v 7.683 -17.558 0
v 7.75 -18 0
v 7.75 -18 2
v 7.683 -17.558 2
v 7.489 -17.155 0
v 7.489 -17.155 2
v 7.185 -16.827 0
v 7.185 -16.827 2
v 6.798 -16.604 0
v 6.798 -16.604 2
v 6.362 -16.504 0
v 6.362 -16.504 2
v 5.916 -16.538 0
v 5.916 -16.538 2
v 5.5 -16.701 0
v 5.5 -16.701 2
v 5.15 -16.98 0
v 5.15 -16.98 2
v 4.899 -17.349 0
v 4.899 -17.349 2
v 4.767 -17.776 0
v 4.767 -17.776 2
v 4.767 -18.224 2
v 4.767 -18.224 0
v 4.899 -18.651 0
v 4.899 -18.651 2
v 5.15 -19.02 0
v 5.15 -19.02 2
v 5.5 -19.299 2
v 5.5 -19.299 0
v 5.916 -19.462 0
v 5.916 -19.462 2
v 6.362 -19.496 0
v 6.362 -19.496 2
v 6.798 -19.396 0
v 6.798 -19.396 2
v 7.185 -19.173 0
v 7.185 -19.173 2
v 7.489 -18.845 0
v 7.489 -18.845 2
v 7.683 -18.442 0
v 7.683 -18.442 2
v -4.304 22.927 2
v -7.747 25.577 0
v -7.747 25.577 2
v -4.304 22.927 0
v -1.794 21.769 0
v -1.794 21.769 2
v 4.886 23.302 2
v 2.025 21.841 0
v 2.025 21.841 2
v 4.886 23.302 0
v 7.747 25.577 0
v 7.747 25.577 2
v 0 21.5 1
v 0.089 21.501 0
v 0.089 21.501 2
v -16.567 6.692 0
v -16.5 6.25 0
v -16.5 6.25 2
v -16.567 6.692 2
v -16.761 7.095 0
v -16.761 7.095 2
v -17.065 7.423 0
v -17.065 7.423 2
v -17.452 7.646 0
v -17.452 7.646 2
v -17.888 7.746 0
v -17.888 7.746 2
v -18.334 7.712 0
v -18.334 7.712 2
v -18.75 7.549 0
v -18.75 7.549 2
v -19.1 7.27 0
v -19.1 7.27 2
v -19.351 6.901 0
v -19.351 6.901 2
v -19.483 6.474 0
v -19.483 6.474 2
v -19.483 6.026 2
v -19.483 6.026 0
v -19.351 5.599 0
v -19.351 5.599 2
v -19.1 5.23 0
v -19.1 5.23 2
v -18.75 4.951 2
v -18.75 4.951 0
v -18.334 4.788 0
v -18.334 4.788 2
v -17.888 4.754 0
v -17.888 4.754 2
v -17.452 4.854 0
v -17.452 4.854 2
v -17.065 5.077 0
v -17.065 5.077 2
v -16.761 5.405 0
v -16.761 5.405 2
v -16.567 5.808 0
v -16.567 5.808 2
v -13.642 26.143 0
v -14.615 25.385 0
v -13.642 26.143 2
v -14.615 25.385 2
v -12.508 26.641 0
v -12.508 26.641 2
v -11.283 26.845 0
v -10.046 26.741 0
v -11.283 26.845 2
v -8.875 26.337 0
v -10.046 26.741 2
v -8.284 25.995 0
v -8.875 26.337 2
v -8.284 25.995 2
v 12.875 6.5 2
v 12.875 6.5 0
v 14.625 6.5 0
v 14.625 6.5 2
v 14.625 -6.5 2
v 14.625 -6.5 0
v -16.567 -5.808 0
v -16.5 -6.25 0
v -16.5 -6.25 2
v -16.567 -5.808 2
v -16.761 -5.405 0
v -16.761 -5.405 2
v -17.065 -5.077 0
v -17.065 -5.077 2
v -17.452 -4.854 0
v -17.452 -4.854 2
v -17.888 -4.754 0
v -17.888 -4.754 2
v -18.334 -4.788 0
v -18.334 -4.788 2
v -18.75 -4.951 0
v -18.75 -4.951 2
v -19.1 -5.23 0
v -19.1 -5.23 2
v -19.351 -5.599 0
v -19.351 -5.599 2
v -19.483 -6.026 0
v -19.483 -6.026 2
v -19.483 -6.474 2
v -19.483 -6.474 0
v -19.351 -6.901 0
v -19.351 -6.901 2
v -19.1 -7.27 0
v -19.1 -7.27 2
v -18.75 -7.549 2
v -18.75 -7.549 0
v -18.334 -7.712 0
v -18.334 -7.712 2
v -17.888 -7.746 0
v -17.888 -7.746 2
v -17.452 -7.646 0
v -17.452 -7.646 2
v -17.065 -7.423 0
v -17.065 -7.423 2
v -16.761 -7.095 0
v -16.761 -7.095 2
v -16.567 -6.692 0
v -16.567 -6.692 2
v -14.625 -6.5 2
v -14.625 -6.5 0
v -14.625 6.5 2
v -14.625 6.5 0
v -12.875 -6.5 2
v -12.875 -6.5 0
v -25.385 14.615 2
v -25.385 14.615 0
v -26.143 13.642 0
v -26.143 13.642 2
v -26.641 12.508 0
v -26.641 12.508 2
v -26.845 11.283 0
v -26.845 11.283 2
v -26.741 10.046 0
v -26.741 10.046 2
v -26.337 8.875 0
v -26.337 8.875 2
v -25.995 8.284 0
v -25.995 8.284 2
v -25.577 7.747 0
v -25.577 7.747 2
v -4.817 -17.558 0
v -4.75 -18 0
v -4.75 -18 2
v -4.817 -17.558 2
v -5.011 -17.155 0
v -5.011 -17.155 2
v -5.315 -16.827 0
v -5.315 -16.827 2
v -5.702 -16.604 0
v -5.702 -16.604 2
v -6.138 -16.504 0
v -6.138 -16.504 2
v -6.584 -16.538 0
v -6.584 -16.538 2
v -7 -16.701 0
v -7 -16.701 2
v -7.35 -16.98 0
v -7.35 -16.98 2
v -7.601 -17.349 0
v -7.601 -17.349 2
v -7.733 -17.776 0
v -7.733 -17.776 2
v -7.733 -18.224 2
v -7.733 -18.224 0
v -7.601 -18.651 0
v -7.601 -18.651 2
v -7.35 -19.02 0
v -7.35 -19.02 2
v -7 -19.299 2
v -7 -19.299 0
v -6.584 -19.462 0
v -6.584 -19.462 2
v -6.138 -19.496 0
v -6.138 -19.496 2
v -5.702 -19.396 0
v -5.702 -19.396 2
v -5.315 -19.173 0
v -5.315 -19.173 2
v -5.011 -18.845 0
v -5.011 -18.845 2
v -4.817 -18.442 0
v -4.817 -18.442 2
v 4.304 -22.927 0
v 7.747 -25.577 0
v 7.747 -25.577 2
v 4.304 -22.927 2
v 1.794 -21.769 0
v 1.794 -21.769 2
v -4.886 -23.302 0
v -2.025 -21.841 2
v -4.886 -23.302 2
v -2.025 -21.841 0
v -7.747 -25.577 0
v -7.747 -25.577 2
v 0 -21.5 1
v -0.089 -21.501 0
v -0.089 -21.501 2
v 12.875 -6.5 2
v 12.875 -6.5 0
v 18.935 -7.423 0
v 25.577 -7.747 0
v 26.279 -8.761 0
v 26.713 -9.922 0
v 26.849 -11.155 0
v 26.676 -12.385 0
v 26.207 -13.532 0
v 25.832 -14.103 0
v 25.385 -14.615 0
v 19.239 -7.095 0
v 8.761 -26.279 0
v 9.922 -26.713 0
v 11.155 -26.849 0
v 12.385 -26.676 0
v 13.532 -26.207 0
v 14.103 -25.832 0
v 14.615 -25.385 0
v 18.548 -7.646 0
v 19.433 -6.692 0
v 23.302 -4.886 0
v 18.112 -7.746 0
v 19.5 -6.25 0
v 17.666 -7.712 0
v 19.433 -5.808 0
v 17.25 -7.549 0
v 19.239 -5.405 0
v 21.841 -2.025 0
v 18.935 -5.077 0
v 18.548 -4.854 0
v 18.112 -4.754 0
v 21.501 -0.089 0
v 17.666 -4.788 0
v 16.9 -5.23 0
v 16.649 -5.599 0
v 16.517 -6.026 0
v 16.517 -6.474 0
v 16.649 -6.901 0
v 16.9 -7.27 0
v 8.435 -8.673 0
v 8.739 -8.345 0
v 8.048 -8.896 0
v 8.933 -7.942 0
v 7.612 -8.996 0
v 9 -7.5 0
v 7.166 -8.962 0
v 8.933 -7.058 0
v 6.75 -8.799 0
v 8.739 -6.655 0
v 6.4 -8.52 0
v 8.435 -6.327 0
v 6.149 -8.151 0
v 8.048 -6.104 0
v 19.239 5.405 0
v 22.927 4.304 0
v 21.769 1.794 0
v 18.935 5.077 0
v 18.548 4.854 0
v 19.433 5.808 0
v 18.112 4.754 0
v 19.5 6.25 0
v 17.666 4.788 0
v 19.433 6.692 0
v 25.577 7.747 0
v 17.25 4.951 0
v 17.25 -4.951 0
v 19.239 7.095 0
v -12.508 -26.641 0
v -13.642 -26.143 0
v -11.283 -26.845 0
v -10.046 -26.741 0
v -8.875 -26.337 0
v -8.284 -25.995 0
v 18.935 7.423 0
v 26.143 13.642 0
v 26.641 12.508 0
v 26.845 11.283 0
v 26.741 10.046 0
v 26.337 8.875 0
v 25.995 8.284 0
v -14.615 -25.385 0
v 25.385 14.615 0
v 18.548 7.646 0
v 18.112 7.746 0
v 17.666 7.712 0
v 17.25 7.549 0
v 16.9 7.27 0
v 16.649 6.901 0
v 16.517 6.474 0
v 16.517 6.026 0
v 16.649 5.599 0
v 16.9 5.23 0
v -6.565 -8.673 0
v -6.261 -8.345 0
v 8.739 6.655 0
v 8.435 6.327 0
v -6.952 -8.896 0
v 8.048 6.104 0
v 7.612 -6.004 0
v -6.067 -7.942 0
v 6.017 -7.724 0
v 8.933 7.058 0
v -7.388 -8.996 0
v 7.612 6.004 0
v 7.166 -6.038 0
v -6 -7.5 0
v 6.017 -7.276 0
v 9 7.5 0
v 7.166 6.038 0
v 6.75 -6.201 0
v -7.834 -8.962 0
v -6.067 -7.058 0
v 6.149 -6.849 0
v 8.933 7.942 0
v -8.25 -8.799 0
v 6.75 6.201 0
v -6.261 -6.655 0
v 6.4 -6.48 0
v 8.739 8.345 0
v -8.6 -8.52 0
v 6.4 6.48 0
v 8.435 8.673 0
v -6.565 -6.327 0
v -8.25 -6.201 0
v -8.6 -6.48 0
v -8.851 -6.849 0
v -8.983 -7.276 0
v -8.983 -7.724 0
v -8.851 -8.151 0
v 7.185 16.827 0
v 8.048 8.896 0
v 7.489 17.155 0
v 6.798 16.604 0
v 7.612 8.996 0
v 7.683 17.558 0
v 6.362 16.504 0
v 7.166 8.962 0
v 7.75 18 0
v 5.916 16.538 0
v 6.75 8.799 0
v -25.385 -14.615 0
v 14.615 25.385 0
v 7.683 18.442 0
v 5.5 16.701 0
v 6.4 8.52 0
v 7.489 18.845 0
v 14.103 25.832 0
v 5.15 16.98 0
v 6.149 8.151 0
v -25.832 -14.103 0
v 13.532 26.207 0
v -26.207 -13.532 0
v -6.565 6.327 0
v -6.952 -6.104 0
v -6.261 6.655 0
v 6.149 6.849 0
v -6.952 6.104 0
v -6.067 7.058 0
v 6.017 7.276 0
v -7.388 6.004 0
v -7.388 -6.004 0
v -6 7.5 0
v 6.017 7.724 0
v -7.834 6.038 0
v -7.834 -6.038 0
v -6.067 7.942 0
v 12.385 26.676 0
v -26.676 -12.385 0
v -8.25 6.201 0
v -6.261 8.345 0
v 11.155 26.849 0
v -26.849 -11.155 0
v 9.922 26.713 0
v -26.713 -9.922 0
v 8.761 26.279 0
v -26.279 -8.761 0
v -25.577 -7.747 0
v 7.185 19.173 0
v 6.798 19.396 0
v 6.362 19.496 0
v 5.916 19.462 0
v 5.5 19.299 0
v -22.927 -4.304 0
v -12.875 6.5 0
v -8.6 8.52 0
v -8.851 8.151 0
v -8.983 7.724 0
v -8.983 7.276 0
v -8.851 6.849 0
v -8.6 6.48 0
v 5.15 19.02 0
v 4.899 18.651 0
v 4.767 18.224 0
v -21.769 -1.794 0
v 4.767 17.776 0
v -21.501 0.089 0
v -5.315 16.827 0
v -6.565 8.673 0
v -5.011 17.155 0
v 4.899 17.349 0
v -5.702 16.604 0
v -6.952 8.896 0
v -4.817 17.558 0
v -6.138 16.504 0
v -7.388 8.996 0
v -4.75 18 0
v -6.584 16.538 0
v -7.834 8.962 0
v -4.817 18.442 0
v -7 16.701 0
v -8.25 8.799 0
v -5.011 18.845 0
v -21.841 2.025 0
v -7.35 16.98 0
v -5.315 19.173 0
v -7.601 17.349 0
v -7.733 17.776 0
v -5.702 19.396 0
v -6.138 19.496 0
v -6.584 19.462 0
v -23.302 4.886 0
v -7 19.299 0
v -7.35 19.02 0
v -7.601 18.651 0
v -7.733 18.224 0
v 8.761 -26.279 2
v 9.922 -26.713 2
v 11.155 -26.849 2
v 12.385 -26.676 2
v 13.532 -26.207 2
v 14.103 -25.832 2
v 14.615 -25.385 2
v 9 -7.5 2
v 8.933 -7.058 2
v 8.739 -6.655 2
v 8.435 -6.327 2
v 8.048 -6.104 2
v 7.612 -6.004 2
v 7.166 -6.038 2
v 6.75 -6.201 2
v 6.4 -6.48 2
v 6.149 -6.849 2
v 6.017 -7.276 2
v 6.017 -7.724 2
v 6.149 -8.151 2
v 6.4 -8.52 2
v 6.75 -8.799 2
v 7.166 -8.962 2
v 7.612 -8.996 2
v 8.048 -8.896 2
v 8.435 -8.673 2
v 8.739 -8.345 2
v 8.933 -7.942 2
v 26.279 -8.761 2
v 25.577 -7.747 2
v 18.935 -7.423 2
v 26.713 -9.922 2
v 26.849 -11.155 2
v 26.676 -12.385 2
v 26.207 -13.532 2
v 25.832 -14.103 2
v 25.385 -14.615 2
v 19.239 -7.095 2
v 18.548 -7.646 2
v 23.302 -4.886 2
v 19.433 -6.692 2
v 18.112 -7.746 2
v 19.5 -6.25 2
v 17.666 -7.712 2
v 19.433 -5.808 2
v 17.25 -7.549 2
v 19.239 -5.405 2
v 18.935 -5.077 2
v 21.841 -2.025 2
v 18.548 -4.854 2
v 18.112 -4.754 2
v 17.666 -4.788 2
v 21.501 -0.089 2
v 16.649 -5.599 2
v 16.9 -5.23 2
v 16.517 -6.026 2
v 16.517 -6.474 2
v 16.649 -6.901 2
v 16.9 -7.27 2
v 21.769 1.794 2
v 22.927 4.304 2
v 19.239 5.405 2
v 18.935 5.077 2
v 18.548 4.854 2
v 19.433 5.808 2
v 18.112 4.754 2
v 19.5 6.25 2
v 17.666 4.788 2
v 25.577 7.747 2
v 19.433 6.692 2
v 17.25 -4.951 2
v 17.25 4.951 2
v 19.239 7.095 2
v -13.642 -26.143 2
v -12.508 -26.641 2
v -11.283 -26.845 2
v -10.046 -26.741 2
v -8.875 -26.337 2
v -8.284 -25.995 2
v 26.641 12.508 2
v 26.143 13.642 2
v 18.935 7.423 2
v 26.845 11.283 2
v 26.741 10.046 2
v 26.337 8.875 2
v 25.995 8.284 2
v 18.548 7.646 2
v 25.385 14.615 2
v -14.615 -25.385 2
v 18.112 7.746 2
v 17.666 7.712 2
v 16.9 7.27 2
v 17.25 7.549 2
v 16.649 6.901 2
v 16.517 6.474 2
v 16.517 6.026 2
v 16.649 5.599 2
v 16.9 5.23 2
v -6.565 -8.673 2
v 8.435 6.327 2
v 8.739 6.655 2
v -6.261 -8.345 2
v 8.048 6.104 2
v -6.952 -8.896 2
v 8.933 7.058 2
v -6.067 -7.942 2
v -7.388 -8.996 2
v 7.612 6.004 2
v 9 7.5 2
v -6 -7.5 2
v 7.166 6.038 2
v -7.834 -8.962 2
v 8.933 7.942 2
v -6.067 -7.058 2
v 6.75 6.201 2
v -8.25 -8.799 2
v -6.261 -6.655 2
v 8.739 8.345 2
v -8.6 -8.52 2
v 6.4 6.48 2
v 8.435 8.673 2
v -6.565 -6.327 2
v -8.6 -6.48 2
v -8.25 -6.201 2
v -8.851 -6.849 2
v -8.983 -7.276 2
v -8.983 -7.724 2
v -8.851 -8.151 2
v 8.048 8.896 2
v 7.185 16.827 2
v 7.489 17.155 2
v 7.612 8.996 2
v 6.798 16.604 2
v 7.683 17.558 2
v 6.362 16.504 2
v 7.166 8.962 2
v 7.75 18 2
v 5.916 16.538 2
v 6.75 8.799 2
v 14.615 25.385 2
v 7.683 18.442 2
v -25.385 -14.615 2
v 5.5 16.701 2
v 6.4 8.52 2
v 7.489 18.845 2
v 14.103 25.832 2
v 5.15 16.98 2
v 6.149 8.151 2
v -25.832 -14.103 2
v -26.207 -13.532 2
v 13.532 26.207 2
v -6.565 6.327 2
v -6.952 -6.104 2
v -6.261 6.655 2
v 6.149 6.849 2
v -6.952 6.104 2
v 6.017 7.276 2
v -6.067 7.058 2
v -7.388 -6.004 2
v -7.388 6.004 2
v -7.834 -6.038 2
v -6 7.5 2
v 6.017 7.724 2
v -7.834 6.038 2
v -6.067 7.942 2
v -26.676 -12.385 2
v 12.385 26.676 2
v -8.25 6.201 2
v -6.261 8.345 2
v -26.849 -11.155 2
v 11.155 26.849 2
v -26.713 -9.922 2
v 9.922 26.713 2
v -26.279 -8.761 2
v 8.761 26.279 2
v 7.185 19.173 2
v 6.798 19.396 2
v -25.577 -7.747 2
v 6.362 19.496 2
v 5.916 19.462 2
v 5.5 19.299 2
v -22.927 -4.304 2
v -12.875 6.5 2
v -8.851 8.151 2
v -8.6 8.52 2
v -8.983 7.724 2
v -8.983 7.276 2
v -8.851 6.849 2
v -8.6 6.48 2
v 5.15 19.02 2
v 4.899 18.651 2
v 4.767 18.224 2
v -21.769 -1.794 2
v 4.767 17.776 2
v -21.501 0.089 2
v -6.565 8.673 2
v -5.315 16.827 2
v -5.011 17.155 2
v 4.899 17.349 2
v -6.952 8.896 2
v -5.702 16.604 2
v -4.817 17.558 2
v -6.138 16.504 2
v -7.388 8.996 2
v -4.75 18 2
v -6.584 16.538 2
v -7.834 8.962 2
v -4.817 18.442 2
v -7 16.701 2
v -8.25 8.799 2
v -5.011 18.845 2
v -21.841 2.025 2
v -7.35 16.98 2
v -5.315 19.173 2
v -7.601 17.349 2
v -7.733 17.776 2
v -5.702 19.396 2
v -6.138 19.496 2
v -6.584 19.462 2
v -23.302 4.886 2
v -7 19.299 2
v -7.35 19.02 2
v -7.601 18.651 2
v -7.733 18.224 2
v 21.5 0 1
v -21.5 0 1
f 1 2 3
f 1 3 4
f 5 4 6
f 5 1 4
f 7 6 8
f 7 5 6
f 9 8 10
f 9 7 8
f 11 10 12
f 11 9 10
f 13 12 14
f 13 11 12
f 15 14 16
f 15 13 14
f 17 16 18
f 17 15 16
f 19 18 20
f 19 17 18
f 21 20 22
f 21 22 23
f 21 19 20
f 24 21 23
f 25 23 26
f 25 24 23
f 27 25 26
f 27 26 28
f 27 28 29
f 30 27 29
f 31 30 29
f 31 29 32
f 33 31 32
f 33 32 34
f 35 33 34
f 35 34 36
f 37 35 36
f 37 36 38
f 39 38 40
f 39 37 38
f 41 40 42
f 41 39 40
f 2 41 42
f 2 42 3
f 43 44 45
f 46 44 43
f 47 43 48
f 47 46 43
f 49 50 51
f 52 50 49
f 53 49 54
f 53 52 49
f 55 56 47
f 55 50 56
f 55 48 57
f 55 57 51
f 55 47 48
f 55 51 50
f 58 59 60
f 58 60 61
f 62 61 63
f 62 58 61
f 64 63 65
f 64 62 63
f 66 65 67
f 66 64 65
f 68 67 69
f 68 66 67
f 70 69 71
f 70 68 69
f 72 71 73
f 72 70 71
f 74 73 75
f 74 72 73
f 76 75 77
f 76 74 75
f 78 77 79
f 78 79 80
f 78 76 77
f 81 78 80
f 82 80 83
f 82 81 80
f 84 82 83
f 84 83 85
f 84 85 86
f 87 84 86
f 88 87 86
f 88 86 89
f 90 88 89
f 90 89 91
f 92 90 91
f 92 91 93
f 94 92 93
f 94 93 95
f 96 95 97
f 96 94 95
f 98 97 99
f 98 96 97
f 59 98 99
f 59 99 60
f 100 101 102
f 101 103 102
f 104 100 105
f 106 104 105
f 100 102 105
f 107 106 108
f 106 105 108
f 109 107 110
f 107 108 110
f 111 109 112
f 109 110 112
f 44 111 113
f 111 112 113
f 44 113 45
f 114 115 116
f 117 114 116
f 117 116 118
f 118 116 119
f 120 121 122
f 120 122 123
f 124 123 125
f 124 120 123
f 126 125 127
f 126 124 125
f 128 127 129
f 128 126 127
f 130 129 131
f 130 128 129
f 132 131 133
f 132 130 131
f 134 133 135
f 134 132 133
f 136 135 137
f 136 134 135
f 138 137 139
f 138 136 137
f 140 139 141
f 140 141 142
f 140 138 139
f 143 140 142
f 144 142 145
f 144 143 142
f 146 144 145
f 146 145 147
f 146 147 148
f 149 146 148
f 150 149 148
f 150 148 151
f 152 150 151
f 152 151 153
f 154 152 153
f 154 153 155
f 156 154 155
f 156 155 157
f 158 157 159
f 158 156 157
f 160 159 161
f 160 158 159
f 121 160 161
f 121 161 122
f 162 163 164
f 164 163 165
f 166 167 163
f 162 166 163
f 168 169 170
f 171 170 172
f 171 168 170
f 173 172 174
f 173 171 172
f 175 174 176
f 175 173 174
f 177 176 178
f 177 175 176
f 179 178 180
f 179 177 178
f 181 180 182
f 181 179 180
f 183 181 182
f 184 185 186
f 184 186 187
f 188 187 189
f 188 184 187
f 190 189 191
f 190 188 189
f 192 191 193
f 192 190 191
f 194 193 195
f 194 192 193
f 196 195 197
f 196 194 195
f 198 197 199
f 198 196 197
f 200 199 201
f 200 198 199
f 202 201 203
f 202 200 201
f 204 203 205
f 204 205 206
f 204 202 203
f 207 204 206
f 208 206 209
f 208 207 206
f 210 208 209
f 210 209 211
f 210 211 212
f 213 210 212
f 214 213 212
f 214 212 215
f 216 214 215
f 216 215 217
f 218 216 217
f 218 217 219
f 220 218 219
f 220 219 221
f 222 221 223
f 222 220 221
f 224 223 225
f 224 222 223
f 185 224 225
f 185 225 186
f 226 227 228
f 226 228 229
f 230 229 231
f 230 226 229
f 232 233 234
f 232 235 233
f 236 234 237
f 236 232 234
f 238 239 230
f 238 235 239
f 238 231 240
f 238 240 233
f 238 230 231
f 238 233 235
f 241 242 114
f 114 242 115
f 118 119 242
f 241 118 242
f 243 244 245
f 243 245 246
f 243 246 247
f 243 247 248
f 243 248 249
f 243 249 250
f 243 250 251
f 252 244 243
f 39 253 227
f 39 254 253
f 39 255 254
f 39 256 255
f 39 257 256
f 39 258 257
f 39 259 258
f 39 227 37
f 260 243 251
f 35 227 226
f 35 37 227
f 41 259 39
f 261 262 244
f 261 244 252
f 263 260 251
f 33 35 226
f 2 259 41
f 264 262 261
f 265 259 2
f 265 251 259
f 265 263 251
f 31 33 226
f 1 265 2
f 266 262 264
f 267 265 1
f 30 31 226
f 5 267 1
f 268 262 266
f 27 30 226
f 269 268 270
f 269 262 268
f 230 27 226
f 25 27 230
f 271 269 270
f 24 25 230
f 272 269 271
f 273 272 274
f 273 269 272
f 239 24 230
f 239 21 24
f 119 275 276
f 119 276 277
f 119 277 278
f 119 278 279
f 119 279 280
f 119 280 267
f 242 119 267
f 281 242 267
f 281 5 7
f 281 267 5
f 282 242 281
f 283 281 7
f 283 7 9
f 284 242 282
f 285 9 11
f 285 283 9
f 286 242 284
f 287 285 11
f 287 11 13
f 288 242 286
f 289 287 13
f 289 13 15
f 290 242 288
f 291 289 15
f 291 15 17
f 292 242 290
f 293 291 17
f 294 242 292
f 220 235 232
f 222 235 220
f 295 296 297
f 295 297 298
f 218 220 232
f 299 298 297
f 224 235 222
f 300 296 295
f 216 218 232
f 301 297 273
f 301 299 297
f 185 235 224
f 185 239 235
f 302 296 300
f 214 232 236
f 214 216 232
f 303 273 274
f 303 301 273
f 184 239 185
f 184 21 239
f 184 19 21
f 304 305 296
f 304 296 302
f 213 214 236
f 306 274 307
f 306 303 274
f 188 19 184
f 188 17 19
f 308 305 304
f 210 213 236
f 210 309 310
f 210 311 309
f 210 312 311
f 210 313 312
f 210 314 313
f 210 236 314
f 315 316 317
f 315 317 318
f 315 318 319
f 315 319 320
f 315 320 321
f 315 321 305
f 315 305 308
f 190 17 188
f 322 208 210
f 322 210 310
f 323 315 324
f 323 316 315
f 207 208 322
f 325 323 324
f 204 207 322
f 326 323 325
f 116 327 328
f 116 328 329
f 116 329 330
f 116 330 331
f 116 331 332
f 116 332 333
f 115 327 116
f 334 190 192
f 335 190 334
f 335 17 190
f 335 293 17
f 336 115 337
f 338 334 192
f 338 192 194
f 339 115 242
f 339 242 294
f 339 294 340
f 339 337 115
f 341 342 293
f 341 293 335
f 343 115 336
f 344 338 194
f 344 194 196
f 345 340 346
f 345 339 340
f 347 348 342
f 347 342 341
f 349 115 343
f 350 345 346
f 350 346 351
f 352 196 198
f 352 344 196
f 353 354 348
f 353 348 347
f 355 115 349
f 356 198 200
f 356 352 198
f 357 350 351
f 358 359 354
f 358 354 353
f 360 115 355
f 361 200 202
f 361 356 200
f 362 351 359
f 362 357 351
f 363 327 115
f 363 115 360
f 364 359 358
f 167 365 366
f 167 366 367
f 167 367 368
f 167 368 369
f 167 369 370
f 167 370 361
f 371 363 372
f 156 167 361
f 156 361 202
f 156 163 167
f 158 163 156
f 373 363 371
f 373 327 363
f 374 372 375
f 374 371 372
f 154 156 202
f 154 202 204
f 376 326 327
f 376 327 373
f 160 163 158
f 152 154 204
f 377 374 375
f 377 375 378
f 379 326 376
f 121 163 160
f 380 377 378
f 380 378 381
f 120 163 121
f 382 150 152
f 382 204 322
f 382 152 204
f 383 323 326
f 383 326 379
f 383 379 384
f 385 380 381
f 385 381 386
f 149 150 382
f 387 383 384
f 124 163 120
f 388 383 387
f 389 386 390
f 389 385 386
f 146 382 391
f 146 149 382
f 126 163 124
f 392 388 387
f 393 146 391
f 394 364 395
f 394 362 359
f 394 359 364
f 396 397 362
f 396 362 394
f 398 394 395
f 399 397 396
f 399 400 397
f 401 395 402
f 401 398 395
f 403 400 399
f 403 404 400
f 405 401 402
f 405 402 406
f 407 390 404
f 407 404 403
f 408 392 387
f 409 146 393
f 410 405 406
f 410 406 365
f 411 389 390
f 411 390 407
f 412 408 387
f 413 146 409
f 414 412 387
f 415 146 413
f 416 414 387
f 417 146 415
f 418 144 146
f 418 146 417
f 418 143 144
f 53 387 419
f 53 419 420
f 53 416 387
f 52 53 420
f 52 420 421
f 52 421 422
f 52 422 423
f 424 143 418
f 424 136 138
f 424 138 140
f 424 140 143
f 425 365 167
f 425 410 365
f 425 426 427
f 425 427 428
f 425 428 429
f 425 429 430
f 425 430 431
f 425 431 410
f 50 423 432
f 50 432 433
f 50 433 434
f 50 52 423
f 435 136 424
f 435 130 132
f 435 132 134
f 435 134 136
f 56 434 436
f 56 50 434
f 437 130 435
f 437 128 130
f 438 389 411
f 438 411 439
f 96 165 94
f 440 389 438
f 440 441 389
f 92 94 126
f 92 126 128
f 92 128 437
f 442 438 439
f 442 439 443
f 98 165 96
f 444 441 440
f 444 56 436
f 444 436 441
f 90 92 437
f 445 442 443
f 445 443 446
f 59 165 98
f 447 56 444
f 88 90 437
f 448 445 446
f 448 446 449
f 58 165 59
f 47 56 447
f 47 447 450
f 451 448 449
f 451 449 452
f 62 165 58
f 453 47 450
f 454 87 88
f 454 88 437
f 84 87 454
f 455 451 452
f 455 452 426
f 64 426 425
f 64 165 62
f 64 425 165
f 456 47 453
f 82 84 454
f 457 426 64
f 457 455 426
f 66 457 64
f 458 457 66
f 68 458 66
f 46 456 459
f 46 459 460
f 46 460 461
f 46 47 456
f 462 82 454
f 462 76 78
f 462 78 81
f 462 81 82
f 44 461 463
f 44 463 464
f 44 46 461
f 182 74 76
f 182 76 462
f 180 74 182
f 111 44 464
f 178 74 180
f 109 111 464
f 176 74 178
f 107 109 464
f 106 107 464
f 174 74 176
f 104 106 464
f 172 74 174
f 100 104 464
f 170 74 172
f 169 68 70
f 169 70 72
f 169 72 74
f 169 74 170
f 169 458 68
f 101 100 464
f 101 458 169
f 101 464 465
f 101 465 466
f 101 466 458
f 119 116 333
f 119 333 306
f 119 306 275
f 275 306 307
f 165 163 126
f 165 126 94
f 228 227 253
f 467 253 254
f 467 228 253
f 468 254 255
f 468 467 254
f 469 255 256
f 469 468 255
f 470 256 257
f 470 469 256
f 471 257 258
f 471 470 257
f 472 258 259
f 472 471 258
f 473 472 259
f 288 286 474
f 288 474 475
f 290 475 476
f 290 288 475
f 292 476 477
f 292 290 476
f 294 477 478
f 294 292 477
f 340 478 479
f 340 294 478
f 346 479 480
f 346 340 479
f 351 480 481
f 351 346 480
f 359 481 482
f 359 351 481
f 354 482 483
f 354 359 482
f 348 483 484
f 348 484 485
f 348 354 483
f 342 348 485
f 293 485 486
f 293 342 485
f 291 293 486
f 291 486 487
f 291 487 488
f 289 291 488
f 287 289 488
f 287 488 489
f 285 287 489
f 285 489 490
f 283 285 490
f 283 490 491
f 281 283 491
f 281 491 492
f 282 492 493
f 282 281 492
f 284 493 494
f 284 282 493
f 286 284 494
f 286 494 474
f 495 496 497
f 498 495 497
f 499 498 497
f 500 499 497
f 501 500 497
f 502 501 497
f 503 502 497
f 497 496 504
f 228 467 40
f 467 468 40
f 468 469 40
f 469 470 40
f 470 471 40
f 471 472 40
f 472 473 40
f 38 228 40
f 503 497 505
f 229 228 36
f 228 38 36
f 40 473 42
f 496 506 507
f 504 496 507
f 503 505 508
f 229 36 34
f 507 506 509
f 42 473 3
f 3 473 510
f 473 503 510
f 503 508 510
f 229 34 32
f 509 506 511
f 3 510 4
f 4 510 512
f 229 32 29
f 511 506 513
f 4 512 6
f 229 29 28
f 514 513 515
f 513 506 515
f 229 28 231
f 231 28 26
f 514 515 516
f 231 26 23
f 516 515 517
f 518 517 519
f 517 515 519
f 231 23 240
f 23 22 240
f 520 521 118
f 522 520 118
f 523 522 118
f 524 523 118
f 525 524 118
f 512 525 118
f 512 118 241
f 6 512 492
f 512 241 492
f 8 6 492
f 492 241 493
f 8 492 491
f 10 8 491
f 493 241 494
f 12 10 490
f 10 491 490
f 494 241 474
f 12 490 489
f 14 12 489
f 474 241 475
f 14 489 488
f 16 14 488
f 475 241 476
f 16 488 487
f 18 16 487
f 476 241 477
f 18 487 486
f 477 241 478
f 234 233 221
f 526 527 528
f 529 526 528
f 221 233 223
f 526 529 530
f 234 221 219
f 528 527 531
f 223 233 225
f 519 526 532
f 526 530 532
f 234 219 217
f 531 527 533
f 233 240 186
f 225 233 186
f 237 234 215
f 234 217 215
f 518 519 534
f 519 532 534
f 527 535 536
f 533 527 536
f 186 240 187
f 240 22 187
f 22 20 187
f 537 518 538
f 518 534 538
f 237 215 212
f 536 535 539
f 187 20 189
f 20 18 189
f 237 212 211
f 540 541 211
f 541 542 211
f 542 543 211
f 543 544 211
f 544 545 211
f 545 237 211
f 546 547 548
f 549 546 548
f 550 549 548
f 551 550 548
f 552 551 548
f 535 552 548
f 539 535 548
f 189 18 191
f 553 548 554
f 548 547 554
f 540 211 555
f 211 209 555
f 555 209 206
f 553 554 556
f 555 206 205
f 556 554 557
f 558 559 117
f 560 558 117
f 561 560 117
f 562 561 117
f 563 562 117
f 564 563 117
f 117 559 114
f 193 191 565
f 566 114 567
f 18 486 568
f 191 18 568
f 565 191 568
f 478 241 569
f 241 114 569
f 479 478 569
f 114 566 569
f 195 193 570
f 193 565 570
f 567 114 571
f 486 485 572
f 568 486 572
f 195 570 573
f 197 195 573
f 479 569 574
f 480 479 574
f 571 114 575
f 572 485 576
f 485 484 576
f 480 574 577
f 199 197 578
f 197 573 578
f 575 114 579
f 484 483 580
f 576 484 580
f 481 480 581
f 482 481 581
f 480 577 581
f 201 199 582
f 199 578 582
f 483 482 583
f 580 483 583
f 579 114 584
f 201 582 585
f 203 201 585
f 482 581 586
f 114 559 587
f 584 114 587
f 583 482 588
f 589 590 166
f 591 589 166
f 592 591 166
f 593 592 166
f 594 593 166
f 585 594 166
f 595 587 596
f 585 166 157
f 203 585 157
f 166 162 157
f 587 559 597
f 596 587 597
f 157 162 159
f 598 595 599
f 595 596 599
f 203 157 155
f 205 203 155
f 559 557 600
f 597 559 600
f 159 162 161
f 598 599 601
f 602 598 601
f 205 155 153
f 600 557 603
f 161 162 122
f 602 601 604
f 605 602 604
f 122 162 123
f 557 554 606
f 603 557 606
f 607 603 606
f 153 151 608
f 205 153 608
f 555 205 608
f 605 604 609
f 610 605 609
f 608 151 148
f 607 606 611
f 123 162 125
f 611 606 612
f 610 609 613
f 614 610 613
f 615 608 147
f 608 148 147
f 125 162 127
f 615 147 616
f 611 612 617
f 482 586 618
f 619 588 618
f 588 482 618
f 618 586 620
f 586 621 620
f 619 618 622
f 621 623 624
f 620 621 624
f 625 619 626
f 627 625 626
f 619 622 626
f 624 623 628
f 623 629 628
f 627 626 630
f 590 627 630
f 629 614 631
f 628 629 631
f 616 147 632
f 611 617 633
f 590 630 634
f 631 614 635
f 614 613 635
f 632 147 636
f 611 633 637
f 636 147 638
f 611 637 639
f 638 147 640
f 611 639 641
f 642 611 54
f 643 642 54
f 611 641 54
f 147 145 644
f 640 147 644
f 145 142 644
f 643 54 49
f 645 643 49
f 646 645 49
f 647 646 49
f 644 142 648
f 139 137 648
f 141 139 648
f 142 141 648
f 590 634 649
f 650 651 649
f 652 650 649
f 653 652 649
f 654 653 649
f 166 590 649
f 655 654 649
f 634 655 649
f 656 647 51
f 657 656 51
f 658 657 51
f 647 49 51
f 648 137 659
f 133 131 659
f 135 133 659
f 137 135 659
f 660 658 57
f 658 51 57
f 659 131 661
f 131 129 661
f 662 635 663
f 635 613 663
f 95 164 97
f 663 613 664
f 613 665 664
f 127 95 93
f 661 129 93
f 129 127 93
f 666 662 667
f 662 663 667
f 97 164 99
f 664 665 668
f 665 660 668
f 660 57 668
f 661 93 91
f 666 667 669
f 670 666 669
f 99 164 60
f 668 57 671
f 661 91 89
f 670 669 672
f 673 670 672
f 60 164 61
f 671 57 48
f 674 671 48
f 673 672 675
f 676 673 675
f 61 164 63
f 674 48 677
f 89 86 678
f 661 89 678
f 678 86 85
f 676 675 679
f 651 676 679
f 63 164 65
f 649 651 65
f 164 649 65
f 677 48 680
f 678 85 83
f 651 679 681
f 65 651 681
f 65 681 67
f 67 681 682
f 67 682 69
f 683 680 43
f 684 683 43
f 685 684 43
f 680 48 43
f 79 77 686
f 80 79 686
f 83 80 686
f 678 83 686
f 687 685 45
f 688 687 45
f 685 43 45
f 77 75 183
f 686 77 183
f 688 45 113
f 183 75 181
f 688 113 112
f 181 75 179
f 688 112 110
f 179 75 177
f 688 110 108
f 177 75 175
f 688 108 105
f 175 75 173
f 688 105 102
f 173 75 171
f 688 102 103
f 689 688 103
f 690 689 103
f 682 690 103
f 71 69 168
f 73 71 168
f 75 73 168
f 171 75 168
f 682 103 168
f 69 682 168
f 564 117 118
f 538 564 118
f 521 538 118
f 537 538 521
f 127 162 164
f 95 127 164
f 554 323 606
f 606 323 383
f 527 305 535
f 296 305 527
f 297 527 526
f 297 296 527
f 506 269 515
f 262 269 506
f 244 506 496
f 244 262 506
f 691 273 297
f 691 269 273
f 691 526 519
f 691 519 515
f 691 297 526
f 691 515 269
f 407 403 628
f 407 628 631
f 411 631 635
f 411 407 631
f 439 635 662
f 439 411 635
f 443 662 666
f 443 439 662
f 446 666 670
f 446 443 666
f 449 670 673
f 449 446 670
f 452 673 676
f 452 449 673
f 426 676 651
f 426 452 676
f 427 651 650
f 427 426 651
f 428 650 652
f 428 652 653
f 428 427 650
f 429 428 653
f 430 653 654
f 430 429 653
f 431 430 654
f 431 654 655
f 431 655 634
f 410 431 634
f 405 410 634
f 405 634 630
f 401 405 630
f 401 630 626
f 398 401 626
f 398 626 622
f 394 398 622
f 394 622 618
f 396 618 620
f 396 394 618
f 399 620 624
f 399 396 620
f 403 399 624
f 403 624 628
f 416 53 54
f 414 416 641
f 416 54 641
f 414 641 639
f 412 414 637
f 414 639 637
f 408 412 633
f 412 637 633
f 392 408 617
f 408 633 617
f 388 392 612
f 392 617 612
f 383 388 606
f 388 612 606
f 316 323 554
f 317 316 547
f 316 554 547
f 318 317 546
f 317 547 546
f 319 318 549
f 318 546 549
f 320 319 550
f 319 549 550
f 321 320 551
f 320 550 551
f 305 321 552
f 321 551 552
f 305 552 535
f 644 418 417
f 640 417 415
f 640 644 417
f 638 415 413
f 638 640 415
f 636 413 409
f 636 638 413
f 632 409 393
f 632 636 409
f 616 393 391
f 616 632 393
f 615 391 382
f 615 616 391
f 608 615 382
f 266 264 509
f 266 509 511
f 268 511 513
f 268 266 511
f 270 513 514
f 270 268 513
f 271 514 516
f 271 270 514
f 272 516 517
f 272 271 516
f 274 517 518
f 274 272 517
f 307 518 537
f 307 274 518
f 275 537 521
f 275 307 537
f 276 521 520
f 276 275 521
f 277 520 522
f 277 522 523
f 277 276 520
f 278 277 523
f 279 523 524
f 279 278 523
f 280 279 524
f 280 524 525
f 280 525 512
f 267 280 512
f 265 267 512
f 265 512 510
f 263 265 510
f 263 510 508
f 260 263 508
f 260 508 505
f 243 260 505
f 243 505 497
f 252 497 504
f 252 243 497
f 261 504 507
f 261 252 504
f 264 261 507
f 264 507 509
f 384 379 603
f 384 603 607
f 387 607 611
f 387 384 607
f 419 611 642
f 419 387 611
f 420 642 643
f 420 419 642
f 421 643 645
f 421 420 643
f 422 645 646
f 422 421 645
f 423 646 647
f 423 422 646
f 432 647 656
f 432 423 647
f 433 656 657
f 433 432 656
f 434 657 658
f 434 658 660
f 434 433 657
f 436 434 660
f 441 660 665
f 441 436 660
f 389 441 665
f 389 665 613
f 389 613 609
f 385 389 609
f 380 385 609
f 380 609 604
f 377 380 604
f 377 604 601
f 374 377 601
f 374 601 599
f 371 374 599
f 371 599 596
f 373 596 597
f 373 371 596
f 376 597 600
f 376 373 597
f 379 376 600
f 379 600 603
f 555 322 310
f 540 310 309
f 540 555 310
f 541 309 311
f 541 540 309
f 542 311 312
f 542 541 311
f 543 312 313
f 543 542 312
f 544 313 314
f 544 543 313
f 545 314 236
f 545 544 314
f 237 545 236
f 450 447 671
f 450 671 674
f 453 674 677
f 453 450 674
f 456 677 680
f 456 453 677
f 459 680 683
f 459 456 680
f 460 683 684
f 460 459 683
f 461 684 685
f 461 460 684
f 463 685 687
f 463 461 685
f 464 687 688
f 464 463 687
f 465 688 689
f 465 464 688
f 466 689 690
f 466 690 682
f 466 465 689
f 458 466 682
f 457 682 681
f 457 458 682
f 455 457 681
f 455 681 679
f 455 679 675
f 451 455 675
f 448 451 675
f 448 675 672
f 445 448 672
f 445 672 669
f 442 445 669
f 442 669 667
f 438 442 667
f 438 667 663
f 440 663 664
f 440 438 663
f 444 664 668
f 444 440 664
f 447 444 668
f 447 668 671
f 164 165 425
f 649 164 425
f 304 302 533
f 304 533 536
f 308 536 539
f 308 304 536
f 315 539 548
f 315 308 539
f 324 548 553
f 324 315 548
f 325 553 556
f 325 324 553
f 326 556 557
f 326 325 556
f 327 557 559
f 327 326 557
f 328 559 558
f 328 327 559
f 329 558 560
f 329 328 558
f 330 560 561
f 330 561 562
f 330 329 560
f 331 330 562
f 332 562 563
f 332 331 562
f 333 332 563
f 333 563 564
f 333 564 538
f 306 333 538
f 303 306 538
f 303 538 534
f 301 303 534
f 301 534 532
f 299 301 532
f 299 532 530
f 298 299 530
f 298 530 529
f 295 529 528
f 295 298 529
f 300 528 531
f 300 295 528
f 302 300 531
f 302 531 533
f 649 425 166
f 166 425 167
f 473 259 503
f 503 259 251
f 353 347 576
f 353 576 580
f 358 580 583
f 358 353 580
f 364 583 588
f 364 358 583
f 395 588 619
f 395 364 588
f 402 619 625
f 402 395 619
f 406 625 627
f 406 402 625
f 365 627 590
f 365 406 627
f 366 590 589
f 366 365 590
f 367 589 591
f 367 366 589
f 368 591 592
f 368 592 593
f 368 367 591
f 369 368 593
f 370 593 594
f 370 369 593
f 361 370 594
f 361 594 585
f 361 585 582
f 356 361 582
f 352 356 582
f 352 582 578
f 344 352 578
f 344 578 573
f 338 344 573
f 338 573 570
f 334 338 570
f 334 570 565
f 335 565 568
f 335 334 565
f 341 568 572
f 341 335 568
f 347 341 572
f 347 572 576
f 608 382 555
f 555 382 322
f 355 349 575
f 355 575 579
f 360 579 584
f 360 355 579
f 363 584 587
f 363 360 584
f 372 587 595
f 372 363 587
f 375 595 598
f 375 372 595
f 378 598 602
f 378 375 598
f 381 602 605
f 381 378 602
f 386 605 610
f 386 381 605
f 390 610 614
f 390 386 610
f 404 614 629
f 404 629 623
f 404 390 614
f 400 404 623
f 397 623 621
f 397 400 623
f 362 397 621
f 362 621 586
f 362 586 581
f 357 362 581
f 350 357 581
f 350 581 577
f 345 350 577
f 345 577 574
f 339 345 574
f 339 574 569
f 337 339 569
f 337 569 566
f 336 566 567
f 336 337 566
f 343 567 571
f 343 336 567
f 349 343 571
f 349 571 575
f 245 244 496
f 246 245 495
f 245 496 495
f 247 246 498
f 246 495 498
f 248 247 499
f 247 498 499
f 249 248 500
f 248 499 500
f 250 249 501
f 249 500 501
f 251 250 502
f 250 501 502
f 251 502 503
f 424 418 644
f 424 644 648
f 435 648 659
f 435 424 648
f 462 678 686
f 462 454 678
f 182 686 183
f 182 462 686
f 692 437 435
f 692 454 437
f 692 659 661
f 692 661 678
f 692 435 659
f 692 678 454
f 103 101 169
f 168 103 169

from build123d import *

# Parameters (mm, degrees)
F0_R     = 1.5
F1_DEPTH = 2
F2_R     = 5


with BuildPart() as f1:
    # F0 (on Top) → F1 (new body)
    with BuildSketch(Plane.XY):
        with BuildLine():
            add(Edge.make_bspline(
                [(-13.142859, 26.857141), (-8.951076, 24.20284), (-4.564468, 21.895542), (0, 20)],
                knots=[66.18026, 66.18026, 66.18026, 66.18026, 80.865454, 80.865454, 80.865454, 80.865454], degree=3))
            Line((-13.142859, 26.857141), (-20, 20))
            Line((-20, 20), (-26.857141, 13.142859))
            add(Edge.make_bspline(
                [(-26.857141, 13.142859), (-24.20284, 8.951076), (-21.895542, 4.564468), (-20, 0)],
                knots=[66.18026, 66.18026, 66.18026, 66.18026, 80.865454, 80.865454, 80.865454, 80.865454], degree=3))
            Line((-20, 0), (-14.625, 0))
            Line((-14.625, 0), (-14.625, 6.5))
            Line((-14.625, 6.5), (-12.875, 6.5))
            Line((-12.875, 6.5), (-12.875, 0))
            Line((-12.875, 0), (0, 0))
            Line((0, 0), (0, 20))
        make_face()
        with Locations((-18, 6.25)):
            Circle(F0_R, mode=Mode.SUBTRACT)
        with Locations((-7.5, 7.5)):
            Circle(F0_R, mode=Mode.SUBTRACT)
        with Locations((-6.25, 18)):
            Circle(F0_R, mode=Mode.SUBTRACT)
        with BuildLine():
            Line((-14.625, 0), (-20, 0))
            add(Edge.make_bspline(
                [(-26.854903, -13.145097), (-24.198754, -8.951027), (-21.891877, -4.563394), (-20, 0)],
                knots=[66.166, 66.166, 66.166, 66.166, 80.865454, 80.865454, 80.865454, 80.865454], degree=3))
            Line((-26.854903, -13.145097), (-20, -20))
            Line((-20, -20), (-13.145097, -26.854903))
            add(Edge.make_bspline(
                [(0, -20), (-4.563394, -21.891877), (-8.951027, -24.198754), (-13.145097, -26.854903)],
                knots=[0, 0, 0, 0, 14.699453, 14.699453, 14.699453, 14.699453], degree=3))
            Line((0, -20), (0, 0))
            Line((0, 0), (-12.875, 0))
            Line((-12.875, 0), (-12.875, -6.5))
            Line((-12.875, -6.5), (-14.625, -6.5))
            Line((-14.625, -6.5), (-14.625, 0))
        make_face()
        with Locations((-6.25, -18)):
            Circle(F0_R, mode=Mode.SUBTRACT)
        with Locations((-18, -6.25)):
            Circle(F0_R, mode=Mode.SUBTRACT)
        with Locations((-7.5, -7.5)):
            Circle(F0_R, mode=Mode.SUBTRACT)
        with BuildLine():
            Line((-11.161165, 28.838835), (-13.142859, 26.857141))
            add(Edge.make_bspline(
                [(-13.142859, 26.857141), (-8.951076, 24.20284), (-4.564468, 21.895542), (0, 20)],
                knots=[66.18026, 66.18026, 66.18026, 66.18026, 80.865454, 80.865454, 80.865454, 80.865454], degree=3))
            add(Edge.make_bspline(
                [(13.145097, 26.854903), (8.951027, 24.198754), (4.563394, 21.891877), (0, 20)],
                knots=[66.166, 66.166, 66.166, 66.166, 80.865454, 80.865454, 80.865454, 80.865454], degree=3))
            Line((13.145097, 26.854903), (11.161165, 28.838835))
            add(Edge.make_bspline(
                [(-11.161165, 28.838835), (-7.440777, 25.169417), (0, 17.830583), (7.440777, 25.169417), (11.161165, 28.838835)],
                knots=[0, 0, 0, 0, 13.357773, 26.715546, 26.715546, 26.715546, 26.715546], degree=3))
        make_face()
        with BuildLine():
            add(Edge.make_bspline(
                [(-26.857141, 13.142859), (-24.20284, 8.951076), (-21.895542, 4.564468), (-20, 0)],
                knots=[66.18026, 66.18026, 66.18026, 66.18026, 80.865454, 80.865454, 80.865454, 80.865454], degree=3))
            Line((-26.857141, 13.142859), (-28.838835, 11.161165))
            add(Edge.make_bspline(
                [(-28.838835, -11.161165), (-25.169417, -7.440777), (-17.830583, 0), (-25.169417, 7.440777), (-28.838835, 11.161165)],
                knots=[0, 0, 0, 0, 13.357773, 26.715546, 26.715546, 26.715546, 26.715546], degree=3))
            Line((-28.838835, -11.161165), (-26.854903, -13.145097))
            add(Edge.make_bspline(
                [(-26.854903, -13.145097), (-24.198754, -8.951027), (-21.891877, -4.563394), (-20, 0)],
                knots=[66.166, 66.166, 66.166, 66.166, 80.865454, 80.865454, 80.865454, 80.865454], degree=3))
        make_face()
        with BuildLine():
            Line((28.838835, 11.161165), (26.854903, 13.145097))
            add(Edge.make_bspline(
                [(26.854903, 13.145097), (24.198754, 8.951027), (21.891877, 4.563394), (20, 0)],
                knots=[66.166, 66.166, 66.166, 66.166, 80.865454, 80.865454, 80.865454, 80.865454], degree=3))
            add(Edge.make_bspline(
                [(20, 0), (21.891877, -4.563394), (24.198754, -8.951027), (26.854903, -13.145097)],
                knots=[0, 0, 0, 0, 14.699454, 14.699454, 14.699454, 14.699454], degree=3))
            Line((26.854903, -13.145097), (28.838835, -11.161165))
            add(Edge.make_bspline(
                [(28.838835, 11.161165), (25.169417, 7.440777), (17.830583, 0), (25.169417, -7.440777), (28.838835, -11.161165)],
                knots=[0, 0, 0, 0, 13.357773, 26.715546, 26.715546, 26.715546, 26.715546], degree=3))
        make_face()
        with BuildLine():
            Line((12.875, 0), (0, 0))
            Line((0, 0), (0, -20))
            add(Edge.make_bspline(
                [(0, -20), (4.563394, -21.891877), (8.951027, -24.198754), (13.145097, -26.854903)],
                knots=[0, 0, 0, 0, 14.699453, 14.699453, 14.699453, 14.699453], degree=3))
            Line((13.145097, -26.854903), (20, -20))
            Line((20, -20), (26.854903, -13.145097))
            add(Edge.make_bspline(
                [(20, 0), (21.891877, -4.563394), (24.198754, -8.951027), (26.854903, -13.145097)],
                knots=[0, 0, 0, 0, 14.699454, 14.699454, 14.699454, 14.699454], degree=3))
            Line((20, 0), (14.625, 0))
            Line((14.625, 0), (14.625, -6.5))
            Line((14.625, -6.5), (12.875, -6.5))
            Line((12.875, -6.5), (12.875, 0))
        make_face()
        with Locations((6.25, -18)):
            Circle(F0_R, mode=Mode.SUBTRACT)
        with Locations((7.5, -7.5)):
            Circle(F0_R, mode=Mode.SUBTRACT)
        with Locations((18, -6.25)):
            Circle(F0_R, mode=Mode.SUBTRACT)
        with BuildLine():
            add(Edge.make_bspline(
                [(0, -20), (4.563394, -21.891877), (8.951027, -24.198754), (13.145097, -26.854903)],
                knots=[0, 0, 0, 0, 14.699453, 14.699453, 14.699453, 14.699453], degree=3))
            add(Edge.make_bspline(
                [(0, -20), (-4.563394, -21.891877), (-8.951027, -24.198754), (-13.145097, -26.854903)],
                knots=[0, 0, 0, 0, 14.699453, 14.699453, 14.699453, 14.699453], degree=3))
            Line((-13.145097, -26.854903), (-11.161165, -28.838835))
            add(Edge.make_bspline(
                [(11.161165, -28.838835), (7.440777, -25.169417), (0, -17.830583), (-7.440777, -25.169417), (-11.161165, -28.838835)],
                knots=[0, 0, 0, 0, 13.357773, 26.715546, 26.715546, 26.715546, 26.715546], degree=3))
            Line((11.161165, -28.838835), (13.145097, -26.854903))
        make_face()
        with BuildLine():
            add(Edge.make_bspline(
                [(13.145097, 26.854903), (8.951027, 24.198754), (4.563394, 21.891877), (0, 20)],
                knots=[66.166, 66.166, 66.166, 66.166, 80.865454, 80.865454, 80.865454, 80.865454], degree=3))
            Line((0, 20), (0, 0))
            Line((0, 0), (12.875, 0))
            Line((12.875, 0), (12.875, 6.5))
            Line((12.875, 6.5), (14.625, 6.5))
            Line((14.625, 6.5), (14.625, 0))
            Line((14.625, 0), (20, 0))
            add(Edge.make_bspline(
                [(26.854903, 13.145097), (24.198754, 8.951027), (21.891877, 4.563394), (20, 0)],
                knots=[66.166, 66.166, 66.166, 66.166, 80.865454, 80.865454, 80.865454, 80.865454], degree=3))
            Line((26.854903, 13.145097), (20, 20))
            Line((20, 20), (13.145097, 26.854903))
        make_face()
        with Locations((7.5, 7.5)):
            Circle(F0_R, mode=Mode.SUBTRACT)
        with Locations((18, 6.25)):
            Circle(F0_R, mode=Mode.SUBTRACT)
        with Locations((6.25, 18)):
            Circle(F0_R, mode=Mode.SUBTRACT)
    extrude(amount=F1_DEPTH)

    # F2
    f2_edges = [f1.edges().sort_by_distance(p)[0] for p in [
        (-11.161165, 28.838835, 1),
        (-28.838835, 11.161165, 1),
        (11.161165, 28.838835, 1),
        (28.838835, 11.161165, 1),
        (28.838835, -11.161165, 1),
        (11.161165, -28.838835, 1),
        (-11.161165, -28.838835, 1),
        (-28.838835, -11.161165, 1),
    ]]
    fillet(f2_edges, radius=F2_R)


solid = f1.part
